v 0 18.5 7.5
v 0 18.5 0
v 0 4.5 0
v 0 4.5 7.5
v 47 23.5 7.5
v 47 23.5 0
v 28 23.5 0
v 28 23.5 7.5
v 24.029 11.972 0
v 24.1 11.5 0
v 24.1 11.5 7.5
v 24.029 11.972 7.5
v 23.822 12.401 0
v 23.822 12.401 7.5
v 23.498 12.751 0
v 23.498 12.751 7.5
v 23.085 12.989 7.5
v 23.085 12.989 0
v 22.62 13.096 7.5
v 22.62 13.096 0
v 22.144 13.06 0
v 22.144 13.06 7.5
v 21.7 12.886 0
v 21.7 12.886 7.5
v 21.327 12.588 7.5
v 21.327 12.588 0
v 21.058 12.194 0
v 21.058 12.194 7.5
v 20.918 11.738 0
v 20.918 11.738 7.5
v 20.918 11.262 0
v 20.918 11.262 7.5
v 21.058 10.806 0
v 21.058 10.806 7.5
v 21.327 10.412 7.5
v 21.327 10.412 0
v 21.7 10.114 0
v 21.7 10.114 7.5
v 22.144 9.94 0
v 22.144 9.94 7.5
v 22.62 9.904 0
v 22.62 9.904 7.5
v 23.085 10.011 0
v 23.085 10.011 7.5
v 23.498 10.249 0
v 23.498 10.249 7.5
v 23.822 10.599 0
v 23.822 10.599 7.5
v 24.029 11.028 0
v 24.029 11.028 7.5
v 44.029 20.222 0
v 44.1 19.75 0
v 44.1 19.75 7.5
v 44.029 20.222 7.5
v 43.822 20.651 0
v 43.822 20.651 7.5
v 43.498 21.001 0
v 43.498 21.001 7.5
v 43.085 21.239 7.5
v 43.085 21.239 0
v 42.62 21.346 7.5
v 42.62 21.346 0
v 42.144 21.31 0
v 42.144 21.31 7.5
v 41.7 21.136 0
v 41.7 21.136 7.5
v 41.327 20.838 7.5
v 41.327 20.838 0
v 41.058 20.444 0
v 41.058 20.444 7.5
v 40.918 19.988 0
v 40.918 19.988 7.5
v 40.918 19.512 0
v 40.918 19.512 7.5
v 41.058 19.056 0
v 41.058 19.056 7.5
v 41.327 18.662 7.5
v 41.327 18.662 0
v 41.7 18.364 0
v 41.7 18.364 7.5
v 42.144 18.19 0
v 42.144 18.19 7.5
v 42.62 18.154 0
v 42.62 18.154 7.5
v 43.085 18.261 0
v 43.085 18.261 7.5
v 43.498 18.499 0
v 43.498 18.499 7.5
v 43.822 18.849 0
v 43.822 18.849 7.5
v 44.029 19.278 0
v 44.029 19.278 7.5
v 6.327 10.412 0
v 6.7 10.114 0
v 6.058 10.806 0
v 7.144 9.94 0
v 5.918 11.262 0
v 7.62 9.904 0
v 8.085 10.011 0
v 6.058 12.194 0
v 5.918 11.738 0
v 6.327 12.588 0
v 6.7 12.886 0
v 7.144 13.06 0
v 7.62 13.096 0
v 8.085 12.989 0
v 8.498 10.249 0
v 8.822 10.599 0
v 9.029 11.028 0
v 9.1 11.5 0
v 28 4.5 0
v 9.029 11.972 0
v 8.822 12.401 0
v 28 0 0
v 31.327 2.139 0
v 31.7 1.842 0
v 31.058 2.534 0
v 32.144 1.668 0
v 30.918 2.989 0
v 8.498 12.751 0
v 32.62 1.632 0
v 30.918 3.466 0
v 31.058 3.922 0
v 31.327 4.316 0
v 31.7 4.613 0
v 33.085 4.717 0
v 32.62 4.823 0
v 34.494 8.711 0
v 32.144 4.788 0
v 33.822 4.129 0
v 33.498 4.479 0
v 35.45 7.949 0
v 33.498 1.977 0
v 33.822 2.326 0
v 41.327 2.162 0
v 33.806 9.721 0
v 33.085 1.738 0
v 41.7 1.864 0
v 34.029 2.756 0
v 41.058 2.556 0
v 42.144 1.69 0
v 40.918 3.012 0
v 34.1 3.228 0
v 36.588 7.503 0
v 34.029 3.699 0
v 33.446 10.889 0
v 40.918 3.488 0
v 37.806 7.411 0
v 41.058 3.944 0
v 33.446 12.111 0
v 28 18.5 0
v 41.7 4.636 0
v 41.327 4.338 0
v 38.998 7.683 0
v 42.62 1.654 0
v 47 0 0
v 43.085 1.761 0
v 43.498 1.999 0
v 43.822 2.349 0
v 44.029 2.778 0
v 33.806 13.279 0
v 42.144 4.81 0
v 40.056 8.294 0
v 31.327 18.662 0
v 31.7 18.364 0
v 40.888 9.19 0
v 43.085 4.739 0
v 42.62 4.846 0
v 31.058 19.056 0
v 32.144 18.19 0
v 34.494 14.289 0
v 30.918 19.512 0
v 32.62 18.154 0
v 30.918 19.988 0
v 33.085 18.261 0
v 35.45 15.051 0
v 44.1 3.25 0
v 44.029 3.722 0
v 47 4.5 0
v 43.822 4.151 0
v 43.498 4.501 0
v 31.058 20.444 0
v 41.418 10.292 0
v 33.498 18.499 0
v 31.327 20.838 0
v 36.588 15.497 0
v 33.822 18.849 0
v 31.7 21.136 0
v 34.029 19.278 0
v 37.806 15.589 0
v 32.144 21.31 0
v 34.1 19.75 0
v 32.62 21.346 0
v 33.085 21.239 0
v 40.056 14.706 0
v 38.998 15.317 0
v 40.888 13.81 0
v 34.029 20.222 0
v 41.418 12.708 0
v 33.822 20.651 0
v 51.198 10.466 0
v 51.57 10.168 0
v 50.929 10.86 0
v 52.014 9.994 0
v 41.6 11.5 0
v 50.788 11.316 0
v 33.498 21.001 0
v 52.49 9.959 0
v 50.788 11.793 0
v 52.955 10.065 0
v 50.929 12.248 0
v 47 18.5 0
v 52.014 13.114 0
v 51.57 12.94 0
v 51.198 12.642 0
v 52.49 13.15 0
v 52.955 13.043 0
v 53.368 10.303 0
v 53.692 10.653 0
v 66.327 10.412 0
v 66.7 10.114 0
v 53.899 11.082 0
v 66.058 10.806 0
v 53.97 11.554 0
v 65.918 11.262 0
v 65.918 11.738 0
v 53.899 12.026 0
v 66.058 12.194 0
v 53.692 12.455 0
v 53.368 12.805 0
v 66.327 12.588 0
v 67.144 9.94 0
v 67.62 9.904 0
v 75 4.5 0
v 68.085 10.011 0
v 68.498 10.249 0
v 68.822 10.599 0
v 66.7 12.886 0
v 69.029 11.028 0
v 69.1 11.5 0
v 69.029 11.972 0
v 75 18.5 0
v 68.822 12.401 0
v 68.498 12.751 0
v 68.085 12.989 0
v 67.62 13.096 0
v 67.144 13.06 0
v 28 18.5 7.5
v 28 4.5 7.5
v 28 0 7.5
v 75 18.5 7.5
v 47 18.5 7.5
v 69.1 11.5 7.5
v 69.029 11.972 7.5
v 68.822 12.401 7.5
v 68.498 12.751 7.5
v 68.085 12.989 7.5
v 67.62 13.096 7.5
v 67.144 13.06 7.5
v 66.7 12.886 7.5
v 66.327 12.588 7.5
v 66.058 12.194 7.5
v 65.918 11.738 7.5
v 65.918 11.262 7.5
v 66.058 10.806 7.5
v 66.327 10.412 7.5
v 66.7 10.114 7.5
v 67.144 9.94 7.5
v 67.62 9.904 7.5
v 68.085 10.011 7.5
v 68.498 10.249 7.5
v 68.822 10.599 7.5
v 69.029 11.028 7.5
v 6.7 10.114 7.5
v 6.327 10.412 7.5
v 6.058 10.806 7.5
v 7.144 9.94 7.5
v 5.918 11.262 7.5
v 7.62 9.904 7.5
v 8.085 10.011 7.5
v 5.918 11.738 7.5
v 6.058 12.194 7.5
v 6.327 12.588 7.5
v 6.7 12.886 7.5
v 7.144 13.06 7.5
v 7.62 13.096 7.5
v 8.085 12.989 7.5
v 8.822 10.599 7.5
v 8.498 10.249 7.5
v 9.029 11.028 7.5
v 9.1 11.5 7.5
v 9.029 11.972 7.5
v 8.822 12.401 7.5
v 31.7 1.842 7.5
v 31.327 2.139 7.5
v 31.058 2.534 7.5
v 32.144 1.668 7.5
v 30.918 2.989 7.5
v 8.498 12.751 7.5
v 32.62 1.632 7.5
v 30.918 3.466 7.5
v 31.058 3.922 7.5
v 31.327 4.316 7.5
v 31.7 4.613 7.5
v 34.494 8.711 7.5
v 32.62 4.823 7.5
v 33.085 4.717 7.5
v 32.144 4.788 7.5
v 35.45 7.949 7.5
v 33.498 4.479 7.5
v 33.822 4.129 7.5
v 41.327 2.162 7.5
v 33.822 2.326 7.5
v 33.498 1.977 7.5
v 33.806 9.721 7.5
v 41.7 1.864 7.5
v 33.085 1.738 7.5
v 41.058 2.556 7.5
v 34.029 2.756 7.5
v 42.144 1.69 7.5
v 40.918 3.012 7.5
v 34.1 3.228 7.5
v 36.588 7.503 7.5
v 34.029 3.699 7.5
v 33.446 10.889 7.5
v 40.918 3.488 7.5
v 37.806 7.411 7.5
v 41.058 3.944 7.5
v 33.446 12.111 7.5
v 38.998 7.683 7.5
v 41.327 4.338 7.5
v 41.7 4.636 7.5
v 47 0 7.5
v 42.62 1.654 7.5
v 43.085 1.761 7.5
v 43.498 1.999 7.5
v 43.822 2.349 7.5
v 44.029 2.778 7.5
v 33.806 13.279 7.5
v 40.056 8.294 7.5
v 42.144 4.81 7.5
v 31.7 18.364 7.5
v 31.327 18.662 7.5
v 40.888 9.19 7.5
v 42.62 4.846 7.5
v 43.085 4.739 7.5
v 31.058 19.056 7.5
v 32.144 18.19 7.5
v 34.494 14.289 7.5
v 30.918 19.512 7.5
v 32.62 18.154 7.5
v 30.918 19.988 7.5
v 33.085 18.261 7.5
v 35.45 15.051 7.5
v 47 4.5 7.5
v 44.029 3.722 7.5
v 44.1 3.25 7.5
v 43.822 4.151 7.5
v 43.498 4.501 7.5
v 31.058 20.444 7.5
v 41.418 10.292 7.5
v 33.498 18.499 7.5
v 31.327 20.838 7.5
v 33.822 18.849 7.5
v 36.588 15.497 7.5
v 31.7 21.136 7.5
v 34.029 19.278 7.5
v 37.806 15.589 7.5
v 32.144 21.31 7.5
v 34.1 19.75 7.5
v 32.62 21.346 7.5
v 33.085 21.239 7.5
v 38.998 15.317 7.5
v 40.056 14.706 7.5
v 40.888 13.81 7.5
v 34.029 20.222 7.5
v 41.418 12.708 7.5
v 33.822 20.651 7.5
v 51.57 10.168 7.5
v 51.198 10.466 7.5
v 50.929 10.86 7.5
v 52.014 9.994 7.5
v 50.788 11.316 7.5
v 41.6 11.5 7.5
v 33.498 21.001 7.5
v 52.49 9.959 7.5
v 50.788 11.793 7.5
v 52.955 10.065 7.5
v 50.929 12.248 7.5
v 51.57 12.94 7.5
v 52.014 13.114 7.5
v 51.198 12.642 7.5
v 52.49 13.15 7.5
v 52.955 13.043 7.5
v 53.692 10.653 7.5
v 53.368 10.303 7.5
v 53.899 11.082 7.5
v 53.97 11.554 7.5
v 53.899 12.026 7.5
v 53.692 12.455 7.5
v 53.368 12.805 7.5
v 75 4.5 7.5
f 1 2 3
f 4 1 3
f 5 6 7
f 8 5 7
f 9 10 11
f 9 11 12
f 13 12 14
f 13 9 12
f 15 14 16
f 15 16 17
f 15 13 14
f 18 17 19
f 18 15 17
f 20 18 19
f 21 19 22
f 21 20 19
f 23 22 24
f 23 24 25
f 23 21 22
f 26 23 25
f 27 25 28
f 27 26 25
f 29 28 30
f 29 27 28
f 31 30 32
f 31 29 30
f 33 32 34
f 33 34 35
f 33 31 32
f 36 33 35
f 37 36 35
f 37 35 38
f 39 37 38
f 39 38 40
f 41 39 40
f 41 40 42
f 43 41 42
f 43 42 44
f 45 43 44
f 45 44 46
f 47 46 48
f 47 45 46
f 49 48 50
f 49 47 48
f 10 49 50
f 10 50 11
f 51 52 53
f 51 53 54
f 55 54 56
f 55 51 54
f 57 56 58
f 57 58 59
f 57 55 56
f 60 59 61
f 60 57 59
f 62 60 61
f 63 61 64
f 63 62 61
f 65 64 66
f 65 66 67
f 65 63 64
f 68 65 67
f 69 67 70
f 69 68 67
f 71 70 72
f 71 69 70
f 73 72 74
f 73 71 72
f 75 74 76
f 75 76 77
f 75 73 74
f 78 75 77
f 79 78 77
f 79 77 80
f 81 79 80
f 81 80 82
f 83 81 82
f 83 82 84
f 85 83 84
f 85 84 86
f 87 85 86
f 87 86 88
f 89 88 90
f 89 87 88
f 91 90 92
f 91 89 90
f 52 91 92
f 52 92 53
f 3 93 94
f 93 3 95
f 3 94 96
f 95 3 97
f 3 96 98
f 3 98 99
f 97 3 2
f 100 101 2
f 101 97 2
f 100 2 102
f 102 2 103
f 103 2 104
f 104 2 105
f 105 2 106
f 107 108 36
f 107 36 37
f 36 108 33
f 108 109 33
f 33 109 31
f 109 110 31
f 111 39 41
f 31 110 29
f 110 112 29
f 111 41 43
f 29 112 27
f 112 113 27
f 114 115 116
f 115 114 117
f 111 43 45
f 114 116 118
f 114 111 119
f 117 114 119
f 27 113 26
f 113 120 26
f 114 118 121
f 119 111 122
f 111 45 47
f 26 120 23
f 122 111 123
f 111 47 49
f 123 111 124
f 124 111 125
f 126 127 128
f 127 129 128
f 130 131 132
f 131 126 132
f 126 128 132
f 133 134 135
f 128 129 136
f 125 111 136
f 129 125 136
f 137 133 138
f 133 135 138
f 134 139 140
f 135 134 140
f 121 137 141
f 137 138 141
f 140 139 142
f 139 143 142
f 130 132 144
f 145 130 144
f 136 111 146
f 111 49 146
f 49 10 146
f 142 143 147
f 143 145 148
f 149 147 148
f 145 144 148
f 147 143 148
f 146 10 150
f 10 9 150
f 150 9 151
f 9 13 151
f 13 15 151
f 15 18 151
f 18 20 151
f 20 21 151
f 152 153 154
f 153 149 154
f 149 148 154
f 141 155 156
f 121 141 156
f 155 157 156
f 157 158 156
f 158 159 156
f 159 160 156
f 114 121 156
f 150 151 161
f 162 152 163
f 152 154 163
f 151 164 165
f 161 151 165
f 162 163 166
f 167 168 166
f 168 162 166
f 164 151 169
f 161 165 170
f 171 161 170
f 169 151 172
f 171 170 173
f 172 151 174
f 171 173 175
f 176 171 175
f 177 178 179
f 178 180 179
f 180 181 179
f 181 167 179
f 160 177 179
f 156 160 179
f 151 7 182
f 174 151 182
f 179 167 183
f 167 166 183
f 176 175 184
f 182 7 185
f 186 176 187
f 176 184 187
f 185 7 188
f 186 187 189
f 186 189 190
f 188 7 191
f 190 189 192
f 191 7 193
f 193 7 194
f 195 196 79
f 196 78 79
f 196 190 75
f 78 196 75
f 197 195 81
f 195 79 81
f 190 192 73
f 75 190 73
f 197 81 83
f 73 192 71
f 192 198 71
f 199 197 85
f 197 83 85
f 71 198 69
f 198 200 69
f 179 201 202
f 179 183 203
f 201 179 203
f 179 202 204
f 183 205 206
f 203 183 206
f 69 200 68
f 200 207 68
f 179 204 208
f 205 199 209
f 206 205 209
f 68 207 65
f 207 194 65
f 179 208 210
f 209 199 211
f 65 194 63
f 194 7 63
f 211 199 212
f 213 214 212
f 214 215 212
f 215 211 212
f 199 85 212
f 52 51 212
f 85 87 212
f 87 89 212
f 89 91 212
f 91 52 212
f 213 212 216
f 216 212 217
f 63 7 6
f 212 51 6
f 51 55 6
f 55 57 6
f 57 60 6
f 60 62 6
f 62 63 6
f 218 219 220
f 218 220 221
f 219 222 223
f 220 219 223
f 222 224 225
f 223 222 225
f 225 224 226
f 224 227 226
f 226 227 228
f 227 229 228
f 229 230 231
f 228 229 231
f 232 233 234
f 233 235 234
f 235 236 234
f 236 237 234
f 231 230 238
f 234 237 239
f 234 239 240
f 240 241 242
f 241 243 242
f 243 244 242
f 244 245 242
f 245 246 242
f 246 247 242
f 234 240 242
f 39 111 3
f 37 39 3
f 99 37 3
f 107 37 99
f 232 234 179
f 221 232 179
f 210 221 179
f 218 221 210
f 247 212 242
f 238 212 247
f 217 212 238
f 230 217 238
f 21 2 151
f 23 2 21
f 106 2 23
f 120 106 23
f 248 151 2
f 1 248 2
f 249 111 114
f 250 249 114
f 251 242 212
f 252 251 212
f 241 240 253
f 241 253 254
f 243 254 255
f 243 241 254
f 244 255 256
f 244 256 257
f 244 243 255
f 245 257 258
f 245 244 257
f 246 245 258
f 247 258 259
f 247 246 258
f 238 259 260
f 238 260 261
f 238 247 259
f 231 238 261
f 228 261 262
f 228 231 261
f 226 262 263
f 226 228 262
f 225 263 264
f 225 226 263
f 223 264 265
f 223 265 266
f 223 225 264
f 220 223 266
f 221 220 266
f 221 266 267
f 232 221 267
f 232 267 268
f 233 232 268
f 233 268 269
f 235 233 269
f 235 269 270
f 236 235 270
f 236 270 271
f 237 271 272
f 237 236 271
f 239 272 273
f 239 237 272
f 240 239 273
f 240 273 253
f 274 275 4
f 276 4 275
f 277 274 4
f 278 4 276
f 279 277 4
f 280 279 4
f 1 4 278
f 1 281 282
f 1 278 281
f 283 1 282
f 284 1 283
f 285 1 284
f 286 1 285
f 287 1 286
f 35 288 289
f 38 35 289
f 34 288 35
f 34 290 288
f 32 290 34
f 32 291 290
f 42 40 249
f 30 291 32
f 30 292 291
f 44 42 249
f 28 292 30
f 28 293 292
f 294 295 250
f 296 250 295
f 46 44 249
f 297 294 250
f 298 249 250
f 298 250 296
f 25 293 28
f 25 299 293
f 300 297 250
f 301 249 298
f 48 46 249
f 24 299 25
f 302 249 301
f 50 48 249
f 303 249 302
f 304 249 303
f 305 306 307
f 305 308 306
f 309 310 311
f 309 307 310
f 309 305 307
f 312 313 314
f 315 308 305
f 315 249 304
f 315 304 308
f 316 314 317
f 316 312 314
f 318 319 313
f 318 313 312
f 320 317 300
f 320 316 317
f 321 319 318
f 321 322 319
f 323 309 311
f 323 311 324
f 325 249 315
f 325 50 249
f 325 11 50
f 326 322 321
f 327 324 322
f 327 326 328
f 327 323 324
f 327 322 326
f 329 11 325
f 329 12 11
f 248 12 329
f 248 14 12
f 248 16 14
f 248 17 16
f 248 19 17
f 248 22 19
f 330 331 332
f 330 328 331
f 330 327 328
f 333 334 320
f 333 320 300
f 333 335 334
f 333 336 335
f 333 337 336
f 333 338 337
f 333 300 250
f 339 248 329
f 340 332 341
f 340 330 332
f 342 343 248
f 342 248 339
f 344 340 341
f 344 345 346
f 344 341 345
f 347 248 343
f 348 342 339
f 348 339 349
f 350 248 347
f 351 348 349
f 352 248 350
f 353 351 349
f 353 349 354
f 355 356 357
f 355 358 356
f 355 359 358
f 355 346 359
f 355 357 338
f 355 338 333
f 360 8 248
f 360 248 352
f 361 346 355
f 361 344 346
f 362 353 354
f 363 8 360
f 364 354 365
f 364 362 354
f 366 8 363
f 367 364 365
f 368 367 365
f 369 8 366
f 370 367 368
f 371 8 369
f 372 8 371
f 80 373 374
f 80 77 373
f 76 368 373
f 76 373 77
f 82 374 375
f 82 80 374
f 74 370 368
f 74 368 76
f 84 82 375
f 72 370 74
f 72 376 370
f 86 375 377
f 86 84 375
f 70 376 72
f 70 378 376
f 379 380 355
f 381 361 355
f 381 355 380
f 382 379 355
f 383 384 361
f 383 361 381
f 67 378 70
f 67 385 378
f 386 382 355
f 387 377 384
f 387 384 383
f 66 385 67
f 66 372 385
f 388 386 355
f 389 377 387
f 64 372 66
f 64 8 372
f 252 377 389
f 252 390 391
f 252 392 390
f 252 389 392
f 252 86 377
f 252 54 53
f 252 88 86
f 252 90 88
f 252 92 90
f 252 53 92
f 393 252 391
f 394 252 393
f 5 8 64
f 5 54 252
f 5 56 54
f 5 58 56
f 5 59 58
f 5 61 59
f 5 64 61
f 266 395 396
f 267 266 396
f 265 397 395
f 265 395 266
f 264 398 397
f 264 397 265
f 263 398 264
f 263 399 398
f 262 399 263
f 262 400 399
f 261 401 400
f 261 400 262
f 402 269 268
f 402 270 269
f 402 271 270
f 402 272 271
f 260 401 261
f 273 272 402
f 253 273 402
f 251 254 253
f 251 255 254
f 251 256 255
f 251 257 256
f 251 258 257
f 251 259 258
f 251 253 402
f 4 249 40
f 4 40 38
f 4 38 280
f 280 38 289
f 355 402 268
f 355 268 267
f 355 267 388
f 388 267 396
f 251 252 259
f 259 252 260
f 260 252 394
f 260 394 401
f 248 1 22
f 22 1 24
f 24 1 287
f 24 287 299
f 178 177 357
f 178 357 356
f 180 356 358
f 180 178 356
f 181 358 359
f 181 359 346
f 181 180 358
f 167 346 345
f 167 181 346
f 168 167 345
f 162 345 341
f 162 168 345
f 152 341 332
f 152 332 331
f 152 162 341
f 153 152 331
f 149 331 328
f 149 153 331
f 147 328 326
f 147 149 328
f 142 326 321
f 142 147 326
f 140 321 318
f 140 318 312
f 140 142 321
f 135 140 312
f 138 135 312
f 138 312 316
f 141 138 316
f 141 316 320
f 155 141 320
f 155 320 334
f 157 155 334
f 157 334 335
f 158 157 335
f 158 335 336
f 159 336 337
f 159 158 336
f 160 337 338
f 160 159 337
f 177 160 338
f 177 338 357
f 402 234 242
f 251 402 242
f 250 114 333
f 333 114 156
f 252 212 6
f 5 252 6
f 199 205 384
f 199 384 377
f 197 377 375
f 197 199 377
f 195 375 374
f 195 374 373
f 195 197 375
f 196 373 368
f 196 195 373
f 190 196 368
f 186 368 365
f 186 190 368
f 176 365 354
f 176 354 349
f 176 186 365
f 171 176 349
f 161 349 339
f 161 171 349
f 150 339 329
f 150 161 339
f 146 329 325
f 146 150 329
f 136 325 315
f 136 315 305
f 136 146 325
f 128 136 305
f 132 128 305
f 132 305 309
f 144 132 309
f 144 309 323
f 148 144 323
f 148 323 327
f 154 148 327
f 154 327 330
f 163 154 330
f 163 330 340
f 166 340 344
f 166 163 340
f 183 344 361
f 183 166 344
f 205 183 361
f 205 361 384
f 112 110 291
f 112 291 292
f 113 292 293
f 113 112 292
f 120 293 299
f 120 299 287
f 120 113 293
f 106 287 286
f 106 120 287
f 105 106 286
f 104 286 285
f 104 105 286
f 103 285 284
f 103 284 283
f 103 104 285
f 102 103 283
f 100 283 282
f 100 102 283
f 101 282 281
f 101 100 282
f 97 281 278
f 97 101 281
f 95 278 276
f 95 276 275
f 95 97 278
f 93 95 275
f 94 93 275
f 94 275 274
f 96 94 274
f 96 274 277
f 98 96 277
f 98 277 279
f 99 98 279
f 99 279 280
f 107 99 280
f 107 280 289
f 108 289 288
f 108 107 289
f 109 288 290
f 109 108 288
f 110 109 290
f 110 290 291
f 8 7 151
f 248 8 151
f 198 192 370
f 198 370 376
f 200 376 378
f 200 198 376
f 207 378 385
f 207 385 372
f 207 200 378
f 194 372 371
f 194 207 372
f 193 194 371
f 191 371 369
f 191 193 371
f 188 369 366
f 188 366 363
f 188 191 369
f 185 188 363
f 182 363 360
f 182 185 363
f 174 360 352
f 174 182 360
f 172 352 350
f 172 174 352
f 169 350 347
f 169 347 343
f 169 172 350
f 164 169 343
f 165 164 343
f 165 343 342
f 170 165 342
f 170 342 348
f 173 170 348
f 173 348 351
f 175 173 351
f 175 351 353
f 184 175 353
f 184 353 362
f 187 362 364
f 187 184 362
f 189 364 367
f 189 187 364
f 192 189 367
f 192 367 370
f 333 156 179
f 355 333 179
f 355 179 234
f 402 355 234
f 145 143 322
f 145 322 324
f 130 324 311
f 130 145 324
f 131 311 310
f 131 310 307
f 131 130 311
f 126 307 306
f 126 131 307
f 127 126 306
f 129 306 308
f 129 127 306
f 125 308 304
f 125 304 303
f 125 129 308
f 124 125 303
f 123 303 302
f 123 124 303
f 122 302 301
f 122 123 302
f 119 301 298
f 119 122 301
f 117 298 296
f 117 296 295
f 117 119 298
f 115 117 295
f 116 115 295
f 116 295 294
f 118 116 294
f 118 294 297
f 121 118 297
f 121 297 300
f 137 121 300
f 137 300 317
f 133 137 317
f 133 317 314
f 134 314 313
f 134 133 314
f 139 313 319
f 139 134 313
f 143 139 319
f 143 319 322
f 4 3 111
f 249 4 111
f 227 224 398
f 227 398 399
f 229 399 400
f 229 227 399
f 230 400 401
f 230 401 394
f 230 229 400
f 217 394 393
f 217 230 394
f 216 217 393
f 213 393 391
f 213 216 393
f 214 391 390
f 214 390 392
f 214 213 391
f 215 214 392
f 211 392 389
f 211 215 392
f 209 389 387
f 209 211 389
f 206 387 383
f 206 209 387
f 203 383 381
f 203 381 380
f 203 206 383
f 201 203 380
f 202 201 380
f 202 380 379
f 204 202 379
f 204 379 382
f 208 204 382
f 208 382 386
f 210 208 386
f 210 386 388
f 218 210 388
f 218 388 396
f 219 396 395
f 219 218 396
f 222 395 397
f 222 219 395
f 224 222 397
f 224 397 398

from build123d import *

# Parameters (mm, degrees)
SKETCH_1_R      = 4.1
SKETCH_1_R_2    = 1.6
EXTRUDE_1_DEPTH = 7.5


with BuildPart() as part:
    # 草图1 → 凸台-拉伸1 (new body)
    with BuildSketch(Plane.XY):
        Polygon((0, 11.5), (0, 4.5), (0.416202301, 4.5), (28, 4.5), (28, 0), (47, 0), (47, 4.5), (75, 4.5), (75, 18.5), (47, 18.5), (47, 23.5), (28, 23.5), (28, 18.5), (0, 18.5), align=None)
        with Locations((37.5, 11.5)):
            Circle(SKETCH_1_R, mode=Mode.SUBTRACT)
        with Locations((67.5, 11.5)):
            Circle(SKETCH_1_R_2, mode=Mode.SUBTRACT)
        with Locations((32.500024738, 3.227756818)):
            Circle(SKETCH_1_R_2, mode=Mode.SUBTRACT)
        with Locations((42.5, 3.25)):
            Circle(SKETCH_1_R_2, mode=Mode.SUBTRACT)
        with Locations((42.5, 19.75)):
            Circle(SKETCH_1_R_2, mode=Mode.SUBTRACT)
        with Locations((32.500024738, 19.75)):
            Circle(SKETCH_1_R_2, mode=Mode.SUBTRACT)
        with Locations((7.5, 11.5)):
            Circle(SKETCH_1_R_2, mode=Mode.SUBTRACT)
        with Locations((52.370486737, 11.554033831)):
            Circle(SKETCH_1_R_2, mode=Mode.SUBTRACT)
        with Locations((22.5, 11.5)):
            Circle(SKETCH_1_R_2, mode=Mode.SUBTRACT)
    extrude(amount=EXTRUDE_1_DEPTH)


solid = part.part
